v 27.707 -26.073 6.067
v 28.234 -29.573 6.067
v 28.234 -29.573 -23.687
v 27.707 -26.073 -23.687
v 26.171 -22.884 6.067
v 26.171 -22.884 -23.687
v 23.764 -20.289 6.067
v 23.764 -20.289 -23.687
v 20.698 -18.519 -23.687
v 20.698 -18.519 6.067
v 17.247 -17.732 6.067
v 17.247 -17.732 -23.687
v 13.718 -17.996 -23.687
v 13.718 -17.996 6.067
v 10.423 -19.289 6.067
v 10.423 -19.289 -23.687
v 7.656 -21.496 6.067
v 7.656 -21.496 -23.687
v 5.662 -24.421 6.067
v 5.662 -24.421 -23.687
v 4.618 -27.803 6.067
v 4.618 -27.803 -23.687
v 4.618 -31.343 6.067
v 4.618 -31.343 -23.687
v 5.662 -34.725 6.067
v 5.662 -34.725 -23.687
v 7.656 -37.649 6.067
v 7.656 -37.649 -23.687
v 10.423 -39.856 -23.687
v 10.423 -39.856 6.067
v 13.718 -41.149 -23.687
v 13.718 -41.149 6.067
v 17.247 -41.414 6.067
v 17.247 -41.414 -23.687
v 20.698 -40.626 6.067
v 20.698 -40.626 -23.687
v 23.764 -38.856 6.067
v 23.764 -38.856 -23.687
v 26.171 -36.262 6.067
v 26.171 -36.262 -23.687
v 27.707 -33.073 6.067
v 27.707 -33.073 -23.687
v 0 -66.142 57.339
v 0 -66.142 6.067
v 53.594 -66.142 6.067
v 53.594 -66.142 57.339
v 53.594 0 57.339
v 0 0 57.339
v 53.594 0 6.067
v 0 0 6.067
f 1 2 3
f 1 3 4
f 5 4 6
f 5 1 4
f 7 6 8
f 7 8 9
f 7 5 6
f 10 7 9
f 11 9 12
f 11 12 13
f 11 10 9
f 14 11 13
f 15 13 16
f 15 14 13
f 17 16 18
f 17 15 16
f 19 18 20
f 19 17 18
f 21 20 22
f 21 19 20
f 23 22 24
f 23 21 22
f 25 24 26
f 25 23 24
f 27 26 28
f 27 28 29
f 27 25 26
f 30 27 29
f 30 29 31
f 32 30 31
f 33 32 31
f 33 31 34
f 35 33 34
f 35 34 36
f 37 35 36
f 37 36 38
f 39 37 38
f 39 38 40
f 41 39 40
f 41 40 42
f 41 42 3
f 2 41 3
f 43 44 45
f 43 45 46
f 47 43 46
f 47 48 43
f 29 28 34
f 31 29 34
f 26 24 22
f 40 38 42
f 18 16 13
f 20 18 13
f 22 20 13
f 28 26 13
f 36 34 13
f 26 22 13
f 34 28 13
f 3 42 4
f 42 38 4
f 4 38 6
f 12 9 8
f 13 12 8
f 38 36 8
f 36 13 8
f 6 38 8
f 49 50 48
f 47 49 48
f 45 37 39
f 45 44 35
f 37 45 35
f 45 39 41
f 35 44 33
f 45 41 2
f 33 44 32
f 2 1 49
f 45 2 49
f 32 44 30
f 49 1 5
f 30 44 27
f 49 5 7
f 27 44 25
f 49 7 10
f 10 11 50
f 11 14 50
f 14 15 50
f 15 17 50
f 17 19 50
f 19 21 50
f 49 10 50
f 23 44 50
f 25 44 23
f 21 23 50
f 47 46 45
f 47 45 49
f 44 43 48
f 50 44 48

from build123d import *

# Parameters (mm, degrees)
F0_W     = 66.141769
F0_H     = 51.272144
F1_DEPTH = 53.594
F2_R     = 11.874226
F3_DEPTH = 81.026


with BuildPart() as f1:
    # F0 (on Right) → F1 (new body)
    with BuildSketch(Plane.YZ):
        with Locations((-33.070884, 31.703164)):
            Rectangle(F0_W, F0_H)
    extrude(amount=F1_DEPTH)

    # F2 (on face) → F3 (join)
    with BuildSketch(Plane.XY.offset(57.339236)):
        with Locations((16.360093, -29.572813)):
            Circle(F2_R)
    extrude(amount=-F3_DEPTH)


solid = f1.part
